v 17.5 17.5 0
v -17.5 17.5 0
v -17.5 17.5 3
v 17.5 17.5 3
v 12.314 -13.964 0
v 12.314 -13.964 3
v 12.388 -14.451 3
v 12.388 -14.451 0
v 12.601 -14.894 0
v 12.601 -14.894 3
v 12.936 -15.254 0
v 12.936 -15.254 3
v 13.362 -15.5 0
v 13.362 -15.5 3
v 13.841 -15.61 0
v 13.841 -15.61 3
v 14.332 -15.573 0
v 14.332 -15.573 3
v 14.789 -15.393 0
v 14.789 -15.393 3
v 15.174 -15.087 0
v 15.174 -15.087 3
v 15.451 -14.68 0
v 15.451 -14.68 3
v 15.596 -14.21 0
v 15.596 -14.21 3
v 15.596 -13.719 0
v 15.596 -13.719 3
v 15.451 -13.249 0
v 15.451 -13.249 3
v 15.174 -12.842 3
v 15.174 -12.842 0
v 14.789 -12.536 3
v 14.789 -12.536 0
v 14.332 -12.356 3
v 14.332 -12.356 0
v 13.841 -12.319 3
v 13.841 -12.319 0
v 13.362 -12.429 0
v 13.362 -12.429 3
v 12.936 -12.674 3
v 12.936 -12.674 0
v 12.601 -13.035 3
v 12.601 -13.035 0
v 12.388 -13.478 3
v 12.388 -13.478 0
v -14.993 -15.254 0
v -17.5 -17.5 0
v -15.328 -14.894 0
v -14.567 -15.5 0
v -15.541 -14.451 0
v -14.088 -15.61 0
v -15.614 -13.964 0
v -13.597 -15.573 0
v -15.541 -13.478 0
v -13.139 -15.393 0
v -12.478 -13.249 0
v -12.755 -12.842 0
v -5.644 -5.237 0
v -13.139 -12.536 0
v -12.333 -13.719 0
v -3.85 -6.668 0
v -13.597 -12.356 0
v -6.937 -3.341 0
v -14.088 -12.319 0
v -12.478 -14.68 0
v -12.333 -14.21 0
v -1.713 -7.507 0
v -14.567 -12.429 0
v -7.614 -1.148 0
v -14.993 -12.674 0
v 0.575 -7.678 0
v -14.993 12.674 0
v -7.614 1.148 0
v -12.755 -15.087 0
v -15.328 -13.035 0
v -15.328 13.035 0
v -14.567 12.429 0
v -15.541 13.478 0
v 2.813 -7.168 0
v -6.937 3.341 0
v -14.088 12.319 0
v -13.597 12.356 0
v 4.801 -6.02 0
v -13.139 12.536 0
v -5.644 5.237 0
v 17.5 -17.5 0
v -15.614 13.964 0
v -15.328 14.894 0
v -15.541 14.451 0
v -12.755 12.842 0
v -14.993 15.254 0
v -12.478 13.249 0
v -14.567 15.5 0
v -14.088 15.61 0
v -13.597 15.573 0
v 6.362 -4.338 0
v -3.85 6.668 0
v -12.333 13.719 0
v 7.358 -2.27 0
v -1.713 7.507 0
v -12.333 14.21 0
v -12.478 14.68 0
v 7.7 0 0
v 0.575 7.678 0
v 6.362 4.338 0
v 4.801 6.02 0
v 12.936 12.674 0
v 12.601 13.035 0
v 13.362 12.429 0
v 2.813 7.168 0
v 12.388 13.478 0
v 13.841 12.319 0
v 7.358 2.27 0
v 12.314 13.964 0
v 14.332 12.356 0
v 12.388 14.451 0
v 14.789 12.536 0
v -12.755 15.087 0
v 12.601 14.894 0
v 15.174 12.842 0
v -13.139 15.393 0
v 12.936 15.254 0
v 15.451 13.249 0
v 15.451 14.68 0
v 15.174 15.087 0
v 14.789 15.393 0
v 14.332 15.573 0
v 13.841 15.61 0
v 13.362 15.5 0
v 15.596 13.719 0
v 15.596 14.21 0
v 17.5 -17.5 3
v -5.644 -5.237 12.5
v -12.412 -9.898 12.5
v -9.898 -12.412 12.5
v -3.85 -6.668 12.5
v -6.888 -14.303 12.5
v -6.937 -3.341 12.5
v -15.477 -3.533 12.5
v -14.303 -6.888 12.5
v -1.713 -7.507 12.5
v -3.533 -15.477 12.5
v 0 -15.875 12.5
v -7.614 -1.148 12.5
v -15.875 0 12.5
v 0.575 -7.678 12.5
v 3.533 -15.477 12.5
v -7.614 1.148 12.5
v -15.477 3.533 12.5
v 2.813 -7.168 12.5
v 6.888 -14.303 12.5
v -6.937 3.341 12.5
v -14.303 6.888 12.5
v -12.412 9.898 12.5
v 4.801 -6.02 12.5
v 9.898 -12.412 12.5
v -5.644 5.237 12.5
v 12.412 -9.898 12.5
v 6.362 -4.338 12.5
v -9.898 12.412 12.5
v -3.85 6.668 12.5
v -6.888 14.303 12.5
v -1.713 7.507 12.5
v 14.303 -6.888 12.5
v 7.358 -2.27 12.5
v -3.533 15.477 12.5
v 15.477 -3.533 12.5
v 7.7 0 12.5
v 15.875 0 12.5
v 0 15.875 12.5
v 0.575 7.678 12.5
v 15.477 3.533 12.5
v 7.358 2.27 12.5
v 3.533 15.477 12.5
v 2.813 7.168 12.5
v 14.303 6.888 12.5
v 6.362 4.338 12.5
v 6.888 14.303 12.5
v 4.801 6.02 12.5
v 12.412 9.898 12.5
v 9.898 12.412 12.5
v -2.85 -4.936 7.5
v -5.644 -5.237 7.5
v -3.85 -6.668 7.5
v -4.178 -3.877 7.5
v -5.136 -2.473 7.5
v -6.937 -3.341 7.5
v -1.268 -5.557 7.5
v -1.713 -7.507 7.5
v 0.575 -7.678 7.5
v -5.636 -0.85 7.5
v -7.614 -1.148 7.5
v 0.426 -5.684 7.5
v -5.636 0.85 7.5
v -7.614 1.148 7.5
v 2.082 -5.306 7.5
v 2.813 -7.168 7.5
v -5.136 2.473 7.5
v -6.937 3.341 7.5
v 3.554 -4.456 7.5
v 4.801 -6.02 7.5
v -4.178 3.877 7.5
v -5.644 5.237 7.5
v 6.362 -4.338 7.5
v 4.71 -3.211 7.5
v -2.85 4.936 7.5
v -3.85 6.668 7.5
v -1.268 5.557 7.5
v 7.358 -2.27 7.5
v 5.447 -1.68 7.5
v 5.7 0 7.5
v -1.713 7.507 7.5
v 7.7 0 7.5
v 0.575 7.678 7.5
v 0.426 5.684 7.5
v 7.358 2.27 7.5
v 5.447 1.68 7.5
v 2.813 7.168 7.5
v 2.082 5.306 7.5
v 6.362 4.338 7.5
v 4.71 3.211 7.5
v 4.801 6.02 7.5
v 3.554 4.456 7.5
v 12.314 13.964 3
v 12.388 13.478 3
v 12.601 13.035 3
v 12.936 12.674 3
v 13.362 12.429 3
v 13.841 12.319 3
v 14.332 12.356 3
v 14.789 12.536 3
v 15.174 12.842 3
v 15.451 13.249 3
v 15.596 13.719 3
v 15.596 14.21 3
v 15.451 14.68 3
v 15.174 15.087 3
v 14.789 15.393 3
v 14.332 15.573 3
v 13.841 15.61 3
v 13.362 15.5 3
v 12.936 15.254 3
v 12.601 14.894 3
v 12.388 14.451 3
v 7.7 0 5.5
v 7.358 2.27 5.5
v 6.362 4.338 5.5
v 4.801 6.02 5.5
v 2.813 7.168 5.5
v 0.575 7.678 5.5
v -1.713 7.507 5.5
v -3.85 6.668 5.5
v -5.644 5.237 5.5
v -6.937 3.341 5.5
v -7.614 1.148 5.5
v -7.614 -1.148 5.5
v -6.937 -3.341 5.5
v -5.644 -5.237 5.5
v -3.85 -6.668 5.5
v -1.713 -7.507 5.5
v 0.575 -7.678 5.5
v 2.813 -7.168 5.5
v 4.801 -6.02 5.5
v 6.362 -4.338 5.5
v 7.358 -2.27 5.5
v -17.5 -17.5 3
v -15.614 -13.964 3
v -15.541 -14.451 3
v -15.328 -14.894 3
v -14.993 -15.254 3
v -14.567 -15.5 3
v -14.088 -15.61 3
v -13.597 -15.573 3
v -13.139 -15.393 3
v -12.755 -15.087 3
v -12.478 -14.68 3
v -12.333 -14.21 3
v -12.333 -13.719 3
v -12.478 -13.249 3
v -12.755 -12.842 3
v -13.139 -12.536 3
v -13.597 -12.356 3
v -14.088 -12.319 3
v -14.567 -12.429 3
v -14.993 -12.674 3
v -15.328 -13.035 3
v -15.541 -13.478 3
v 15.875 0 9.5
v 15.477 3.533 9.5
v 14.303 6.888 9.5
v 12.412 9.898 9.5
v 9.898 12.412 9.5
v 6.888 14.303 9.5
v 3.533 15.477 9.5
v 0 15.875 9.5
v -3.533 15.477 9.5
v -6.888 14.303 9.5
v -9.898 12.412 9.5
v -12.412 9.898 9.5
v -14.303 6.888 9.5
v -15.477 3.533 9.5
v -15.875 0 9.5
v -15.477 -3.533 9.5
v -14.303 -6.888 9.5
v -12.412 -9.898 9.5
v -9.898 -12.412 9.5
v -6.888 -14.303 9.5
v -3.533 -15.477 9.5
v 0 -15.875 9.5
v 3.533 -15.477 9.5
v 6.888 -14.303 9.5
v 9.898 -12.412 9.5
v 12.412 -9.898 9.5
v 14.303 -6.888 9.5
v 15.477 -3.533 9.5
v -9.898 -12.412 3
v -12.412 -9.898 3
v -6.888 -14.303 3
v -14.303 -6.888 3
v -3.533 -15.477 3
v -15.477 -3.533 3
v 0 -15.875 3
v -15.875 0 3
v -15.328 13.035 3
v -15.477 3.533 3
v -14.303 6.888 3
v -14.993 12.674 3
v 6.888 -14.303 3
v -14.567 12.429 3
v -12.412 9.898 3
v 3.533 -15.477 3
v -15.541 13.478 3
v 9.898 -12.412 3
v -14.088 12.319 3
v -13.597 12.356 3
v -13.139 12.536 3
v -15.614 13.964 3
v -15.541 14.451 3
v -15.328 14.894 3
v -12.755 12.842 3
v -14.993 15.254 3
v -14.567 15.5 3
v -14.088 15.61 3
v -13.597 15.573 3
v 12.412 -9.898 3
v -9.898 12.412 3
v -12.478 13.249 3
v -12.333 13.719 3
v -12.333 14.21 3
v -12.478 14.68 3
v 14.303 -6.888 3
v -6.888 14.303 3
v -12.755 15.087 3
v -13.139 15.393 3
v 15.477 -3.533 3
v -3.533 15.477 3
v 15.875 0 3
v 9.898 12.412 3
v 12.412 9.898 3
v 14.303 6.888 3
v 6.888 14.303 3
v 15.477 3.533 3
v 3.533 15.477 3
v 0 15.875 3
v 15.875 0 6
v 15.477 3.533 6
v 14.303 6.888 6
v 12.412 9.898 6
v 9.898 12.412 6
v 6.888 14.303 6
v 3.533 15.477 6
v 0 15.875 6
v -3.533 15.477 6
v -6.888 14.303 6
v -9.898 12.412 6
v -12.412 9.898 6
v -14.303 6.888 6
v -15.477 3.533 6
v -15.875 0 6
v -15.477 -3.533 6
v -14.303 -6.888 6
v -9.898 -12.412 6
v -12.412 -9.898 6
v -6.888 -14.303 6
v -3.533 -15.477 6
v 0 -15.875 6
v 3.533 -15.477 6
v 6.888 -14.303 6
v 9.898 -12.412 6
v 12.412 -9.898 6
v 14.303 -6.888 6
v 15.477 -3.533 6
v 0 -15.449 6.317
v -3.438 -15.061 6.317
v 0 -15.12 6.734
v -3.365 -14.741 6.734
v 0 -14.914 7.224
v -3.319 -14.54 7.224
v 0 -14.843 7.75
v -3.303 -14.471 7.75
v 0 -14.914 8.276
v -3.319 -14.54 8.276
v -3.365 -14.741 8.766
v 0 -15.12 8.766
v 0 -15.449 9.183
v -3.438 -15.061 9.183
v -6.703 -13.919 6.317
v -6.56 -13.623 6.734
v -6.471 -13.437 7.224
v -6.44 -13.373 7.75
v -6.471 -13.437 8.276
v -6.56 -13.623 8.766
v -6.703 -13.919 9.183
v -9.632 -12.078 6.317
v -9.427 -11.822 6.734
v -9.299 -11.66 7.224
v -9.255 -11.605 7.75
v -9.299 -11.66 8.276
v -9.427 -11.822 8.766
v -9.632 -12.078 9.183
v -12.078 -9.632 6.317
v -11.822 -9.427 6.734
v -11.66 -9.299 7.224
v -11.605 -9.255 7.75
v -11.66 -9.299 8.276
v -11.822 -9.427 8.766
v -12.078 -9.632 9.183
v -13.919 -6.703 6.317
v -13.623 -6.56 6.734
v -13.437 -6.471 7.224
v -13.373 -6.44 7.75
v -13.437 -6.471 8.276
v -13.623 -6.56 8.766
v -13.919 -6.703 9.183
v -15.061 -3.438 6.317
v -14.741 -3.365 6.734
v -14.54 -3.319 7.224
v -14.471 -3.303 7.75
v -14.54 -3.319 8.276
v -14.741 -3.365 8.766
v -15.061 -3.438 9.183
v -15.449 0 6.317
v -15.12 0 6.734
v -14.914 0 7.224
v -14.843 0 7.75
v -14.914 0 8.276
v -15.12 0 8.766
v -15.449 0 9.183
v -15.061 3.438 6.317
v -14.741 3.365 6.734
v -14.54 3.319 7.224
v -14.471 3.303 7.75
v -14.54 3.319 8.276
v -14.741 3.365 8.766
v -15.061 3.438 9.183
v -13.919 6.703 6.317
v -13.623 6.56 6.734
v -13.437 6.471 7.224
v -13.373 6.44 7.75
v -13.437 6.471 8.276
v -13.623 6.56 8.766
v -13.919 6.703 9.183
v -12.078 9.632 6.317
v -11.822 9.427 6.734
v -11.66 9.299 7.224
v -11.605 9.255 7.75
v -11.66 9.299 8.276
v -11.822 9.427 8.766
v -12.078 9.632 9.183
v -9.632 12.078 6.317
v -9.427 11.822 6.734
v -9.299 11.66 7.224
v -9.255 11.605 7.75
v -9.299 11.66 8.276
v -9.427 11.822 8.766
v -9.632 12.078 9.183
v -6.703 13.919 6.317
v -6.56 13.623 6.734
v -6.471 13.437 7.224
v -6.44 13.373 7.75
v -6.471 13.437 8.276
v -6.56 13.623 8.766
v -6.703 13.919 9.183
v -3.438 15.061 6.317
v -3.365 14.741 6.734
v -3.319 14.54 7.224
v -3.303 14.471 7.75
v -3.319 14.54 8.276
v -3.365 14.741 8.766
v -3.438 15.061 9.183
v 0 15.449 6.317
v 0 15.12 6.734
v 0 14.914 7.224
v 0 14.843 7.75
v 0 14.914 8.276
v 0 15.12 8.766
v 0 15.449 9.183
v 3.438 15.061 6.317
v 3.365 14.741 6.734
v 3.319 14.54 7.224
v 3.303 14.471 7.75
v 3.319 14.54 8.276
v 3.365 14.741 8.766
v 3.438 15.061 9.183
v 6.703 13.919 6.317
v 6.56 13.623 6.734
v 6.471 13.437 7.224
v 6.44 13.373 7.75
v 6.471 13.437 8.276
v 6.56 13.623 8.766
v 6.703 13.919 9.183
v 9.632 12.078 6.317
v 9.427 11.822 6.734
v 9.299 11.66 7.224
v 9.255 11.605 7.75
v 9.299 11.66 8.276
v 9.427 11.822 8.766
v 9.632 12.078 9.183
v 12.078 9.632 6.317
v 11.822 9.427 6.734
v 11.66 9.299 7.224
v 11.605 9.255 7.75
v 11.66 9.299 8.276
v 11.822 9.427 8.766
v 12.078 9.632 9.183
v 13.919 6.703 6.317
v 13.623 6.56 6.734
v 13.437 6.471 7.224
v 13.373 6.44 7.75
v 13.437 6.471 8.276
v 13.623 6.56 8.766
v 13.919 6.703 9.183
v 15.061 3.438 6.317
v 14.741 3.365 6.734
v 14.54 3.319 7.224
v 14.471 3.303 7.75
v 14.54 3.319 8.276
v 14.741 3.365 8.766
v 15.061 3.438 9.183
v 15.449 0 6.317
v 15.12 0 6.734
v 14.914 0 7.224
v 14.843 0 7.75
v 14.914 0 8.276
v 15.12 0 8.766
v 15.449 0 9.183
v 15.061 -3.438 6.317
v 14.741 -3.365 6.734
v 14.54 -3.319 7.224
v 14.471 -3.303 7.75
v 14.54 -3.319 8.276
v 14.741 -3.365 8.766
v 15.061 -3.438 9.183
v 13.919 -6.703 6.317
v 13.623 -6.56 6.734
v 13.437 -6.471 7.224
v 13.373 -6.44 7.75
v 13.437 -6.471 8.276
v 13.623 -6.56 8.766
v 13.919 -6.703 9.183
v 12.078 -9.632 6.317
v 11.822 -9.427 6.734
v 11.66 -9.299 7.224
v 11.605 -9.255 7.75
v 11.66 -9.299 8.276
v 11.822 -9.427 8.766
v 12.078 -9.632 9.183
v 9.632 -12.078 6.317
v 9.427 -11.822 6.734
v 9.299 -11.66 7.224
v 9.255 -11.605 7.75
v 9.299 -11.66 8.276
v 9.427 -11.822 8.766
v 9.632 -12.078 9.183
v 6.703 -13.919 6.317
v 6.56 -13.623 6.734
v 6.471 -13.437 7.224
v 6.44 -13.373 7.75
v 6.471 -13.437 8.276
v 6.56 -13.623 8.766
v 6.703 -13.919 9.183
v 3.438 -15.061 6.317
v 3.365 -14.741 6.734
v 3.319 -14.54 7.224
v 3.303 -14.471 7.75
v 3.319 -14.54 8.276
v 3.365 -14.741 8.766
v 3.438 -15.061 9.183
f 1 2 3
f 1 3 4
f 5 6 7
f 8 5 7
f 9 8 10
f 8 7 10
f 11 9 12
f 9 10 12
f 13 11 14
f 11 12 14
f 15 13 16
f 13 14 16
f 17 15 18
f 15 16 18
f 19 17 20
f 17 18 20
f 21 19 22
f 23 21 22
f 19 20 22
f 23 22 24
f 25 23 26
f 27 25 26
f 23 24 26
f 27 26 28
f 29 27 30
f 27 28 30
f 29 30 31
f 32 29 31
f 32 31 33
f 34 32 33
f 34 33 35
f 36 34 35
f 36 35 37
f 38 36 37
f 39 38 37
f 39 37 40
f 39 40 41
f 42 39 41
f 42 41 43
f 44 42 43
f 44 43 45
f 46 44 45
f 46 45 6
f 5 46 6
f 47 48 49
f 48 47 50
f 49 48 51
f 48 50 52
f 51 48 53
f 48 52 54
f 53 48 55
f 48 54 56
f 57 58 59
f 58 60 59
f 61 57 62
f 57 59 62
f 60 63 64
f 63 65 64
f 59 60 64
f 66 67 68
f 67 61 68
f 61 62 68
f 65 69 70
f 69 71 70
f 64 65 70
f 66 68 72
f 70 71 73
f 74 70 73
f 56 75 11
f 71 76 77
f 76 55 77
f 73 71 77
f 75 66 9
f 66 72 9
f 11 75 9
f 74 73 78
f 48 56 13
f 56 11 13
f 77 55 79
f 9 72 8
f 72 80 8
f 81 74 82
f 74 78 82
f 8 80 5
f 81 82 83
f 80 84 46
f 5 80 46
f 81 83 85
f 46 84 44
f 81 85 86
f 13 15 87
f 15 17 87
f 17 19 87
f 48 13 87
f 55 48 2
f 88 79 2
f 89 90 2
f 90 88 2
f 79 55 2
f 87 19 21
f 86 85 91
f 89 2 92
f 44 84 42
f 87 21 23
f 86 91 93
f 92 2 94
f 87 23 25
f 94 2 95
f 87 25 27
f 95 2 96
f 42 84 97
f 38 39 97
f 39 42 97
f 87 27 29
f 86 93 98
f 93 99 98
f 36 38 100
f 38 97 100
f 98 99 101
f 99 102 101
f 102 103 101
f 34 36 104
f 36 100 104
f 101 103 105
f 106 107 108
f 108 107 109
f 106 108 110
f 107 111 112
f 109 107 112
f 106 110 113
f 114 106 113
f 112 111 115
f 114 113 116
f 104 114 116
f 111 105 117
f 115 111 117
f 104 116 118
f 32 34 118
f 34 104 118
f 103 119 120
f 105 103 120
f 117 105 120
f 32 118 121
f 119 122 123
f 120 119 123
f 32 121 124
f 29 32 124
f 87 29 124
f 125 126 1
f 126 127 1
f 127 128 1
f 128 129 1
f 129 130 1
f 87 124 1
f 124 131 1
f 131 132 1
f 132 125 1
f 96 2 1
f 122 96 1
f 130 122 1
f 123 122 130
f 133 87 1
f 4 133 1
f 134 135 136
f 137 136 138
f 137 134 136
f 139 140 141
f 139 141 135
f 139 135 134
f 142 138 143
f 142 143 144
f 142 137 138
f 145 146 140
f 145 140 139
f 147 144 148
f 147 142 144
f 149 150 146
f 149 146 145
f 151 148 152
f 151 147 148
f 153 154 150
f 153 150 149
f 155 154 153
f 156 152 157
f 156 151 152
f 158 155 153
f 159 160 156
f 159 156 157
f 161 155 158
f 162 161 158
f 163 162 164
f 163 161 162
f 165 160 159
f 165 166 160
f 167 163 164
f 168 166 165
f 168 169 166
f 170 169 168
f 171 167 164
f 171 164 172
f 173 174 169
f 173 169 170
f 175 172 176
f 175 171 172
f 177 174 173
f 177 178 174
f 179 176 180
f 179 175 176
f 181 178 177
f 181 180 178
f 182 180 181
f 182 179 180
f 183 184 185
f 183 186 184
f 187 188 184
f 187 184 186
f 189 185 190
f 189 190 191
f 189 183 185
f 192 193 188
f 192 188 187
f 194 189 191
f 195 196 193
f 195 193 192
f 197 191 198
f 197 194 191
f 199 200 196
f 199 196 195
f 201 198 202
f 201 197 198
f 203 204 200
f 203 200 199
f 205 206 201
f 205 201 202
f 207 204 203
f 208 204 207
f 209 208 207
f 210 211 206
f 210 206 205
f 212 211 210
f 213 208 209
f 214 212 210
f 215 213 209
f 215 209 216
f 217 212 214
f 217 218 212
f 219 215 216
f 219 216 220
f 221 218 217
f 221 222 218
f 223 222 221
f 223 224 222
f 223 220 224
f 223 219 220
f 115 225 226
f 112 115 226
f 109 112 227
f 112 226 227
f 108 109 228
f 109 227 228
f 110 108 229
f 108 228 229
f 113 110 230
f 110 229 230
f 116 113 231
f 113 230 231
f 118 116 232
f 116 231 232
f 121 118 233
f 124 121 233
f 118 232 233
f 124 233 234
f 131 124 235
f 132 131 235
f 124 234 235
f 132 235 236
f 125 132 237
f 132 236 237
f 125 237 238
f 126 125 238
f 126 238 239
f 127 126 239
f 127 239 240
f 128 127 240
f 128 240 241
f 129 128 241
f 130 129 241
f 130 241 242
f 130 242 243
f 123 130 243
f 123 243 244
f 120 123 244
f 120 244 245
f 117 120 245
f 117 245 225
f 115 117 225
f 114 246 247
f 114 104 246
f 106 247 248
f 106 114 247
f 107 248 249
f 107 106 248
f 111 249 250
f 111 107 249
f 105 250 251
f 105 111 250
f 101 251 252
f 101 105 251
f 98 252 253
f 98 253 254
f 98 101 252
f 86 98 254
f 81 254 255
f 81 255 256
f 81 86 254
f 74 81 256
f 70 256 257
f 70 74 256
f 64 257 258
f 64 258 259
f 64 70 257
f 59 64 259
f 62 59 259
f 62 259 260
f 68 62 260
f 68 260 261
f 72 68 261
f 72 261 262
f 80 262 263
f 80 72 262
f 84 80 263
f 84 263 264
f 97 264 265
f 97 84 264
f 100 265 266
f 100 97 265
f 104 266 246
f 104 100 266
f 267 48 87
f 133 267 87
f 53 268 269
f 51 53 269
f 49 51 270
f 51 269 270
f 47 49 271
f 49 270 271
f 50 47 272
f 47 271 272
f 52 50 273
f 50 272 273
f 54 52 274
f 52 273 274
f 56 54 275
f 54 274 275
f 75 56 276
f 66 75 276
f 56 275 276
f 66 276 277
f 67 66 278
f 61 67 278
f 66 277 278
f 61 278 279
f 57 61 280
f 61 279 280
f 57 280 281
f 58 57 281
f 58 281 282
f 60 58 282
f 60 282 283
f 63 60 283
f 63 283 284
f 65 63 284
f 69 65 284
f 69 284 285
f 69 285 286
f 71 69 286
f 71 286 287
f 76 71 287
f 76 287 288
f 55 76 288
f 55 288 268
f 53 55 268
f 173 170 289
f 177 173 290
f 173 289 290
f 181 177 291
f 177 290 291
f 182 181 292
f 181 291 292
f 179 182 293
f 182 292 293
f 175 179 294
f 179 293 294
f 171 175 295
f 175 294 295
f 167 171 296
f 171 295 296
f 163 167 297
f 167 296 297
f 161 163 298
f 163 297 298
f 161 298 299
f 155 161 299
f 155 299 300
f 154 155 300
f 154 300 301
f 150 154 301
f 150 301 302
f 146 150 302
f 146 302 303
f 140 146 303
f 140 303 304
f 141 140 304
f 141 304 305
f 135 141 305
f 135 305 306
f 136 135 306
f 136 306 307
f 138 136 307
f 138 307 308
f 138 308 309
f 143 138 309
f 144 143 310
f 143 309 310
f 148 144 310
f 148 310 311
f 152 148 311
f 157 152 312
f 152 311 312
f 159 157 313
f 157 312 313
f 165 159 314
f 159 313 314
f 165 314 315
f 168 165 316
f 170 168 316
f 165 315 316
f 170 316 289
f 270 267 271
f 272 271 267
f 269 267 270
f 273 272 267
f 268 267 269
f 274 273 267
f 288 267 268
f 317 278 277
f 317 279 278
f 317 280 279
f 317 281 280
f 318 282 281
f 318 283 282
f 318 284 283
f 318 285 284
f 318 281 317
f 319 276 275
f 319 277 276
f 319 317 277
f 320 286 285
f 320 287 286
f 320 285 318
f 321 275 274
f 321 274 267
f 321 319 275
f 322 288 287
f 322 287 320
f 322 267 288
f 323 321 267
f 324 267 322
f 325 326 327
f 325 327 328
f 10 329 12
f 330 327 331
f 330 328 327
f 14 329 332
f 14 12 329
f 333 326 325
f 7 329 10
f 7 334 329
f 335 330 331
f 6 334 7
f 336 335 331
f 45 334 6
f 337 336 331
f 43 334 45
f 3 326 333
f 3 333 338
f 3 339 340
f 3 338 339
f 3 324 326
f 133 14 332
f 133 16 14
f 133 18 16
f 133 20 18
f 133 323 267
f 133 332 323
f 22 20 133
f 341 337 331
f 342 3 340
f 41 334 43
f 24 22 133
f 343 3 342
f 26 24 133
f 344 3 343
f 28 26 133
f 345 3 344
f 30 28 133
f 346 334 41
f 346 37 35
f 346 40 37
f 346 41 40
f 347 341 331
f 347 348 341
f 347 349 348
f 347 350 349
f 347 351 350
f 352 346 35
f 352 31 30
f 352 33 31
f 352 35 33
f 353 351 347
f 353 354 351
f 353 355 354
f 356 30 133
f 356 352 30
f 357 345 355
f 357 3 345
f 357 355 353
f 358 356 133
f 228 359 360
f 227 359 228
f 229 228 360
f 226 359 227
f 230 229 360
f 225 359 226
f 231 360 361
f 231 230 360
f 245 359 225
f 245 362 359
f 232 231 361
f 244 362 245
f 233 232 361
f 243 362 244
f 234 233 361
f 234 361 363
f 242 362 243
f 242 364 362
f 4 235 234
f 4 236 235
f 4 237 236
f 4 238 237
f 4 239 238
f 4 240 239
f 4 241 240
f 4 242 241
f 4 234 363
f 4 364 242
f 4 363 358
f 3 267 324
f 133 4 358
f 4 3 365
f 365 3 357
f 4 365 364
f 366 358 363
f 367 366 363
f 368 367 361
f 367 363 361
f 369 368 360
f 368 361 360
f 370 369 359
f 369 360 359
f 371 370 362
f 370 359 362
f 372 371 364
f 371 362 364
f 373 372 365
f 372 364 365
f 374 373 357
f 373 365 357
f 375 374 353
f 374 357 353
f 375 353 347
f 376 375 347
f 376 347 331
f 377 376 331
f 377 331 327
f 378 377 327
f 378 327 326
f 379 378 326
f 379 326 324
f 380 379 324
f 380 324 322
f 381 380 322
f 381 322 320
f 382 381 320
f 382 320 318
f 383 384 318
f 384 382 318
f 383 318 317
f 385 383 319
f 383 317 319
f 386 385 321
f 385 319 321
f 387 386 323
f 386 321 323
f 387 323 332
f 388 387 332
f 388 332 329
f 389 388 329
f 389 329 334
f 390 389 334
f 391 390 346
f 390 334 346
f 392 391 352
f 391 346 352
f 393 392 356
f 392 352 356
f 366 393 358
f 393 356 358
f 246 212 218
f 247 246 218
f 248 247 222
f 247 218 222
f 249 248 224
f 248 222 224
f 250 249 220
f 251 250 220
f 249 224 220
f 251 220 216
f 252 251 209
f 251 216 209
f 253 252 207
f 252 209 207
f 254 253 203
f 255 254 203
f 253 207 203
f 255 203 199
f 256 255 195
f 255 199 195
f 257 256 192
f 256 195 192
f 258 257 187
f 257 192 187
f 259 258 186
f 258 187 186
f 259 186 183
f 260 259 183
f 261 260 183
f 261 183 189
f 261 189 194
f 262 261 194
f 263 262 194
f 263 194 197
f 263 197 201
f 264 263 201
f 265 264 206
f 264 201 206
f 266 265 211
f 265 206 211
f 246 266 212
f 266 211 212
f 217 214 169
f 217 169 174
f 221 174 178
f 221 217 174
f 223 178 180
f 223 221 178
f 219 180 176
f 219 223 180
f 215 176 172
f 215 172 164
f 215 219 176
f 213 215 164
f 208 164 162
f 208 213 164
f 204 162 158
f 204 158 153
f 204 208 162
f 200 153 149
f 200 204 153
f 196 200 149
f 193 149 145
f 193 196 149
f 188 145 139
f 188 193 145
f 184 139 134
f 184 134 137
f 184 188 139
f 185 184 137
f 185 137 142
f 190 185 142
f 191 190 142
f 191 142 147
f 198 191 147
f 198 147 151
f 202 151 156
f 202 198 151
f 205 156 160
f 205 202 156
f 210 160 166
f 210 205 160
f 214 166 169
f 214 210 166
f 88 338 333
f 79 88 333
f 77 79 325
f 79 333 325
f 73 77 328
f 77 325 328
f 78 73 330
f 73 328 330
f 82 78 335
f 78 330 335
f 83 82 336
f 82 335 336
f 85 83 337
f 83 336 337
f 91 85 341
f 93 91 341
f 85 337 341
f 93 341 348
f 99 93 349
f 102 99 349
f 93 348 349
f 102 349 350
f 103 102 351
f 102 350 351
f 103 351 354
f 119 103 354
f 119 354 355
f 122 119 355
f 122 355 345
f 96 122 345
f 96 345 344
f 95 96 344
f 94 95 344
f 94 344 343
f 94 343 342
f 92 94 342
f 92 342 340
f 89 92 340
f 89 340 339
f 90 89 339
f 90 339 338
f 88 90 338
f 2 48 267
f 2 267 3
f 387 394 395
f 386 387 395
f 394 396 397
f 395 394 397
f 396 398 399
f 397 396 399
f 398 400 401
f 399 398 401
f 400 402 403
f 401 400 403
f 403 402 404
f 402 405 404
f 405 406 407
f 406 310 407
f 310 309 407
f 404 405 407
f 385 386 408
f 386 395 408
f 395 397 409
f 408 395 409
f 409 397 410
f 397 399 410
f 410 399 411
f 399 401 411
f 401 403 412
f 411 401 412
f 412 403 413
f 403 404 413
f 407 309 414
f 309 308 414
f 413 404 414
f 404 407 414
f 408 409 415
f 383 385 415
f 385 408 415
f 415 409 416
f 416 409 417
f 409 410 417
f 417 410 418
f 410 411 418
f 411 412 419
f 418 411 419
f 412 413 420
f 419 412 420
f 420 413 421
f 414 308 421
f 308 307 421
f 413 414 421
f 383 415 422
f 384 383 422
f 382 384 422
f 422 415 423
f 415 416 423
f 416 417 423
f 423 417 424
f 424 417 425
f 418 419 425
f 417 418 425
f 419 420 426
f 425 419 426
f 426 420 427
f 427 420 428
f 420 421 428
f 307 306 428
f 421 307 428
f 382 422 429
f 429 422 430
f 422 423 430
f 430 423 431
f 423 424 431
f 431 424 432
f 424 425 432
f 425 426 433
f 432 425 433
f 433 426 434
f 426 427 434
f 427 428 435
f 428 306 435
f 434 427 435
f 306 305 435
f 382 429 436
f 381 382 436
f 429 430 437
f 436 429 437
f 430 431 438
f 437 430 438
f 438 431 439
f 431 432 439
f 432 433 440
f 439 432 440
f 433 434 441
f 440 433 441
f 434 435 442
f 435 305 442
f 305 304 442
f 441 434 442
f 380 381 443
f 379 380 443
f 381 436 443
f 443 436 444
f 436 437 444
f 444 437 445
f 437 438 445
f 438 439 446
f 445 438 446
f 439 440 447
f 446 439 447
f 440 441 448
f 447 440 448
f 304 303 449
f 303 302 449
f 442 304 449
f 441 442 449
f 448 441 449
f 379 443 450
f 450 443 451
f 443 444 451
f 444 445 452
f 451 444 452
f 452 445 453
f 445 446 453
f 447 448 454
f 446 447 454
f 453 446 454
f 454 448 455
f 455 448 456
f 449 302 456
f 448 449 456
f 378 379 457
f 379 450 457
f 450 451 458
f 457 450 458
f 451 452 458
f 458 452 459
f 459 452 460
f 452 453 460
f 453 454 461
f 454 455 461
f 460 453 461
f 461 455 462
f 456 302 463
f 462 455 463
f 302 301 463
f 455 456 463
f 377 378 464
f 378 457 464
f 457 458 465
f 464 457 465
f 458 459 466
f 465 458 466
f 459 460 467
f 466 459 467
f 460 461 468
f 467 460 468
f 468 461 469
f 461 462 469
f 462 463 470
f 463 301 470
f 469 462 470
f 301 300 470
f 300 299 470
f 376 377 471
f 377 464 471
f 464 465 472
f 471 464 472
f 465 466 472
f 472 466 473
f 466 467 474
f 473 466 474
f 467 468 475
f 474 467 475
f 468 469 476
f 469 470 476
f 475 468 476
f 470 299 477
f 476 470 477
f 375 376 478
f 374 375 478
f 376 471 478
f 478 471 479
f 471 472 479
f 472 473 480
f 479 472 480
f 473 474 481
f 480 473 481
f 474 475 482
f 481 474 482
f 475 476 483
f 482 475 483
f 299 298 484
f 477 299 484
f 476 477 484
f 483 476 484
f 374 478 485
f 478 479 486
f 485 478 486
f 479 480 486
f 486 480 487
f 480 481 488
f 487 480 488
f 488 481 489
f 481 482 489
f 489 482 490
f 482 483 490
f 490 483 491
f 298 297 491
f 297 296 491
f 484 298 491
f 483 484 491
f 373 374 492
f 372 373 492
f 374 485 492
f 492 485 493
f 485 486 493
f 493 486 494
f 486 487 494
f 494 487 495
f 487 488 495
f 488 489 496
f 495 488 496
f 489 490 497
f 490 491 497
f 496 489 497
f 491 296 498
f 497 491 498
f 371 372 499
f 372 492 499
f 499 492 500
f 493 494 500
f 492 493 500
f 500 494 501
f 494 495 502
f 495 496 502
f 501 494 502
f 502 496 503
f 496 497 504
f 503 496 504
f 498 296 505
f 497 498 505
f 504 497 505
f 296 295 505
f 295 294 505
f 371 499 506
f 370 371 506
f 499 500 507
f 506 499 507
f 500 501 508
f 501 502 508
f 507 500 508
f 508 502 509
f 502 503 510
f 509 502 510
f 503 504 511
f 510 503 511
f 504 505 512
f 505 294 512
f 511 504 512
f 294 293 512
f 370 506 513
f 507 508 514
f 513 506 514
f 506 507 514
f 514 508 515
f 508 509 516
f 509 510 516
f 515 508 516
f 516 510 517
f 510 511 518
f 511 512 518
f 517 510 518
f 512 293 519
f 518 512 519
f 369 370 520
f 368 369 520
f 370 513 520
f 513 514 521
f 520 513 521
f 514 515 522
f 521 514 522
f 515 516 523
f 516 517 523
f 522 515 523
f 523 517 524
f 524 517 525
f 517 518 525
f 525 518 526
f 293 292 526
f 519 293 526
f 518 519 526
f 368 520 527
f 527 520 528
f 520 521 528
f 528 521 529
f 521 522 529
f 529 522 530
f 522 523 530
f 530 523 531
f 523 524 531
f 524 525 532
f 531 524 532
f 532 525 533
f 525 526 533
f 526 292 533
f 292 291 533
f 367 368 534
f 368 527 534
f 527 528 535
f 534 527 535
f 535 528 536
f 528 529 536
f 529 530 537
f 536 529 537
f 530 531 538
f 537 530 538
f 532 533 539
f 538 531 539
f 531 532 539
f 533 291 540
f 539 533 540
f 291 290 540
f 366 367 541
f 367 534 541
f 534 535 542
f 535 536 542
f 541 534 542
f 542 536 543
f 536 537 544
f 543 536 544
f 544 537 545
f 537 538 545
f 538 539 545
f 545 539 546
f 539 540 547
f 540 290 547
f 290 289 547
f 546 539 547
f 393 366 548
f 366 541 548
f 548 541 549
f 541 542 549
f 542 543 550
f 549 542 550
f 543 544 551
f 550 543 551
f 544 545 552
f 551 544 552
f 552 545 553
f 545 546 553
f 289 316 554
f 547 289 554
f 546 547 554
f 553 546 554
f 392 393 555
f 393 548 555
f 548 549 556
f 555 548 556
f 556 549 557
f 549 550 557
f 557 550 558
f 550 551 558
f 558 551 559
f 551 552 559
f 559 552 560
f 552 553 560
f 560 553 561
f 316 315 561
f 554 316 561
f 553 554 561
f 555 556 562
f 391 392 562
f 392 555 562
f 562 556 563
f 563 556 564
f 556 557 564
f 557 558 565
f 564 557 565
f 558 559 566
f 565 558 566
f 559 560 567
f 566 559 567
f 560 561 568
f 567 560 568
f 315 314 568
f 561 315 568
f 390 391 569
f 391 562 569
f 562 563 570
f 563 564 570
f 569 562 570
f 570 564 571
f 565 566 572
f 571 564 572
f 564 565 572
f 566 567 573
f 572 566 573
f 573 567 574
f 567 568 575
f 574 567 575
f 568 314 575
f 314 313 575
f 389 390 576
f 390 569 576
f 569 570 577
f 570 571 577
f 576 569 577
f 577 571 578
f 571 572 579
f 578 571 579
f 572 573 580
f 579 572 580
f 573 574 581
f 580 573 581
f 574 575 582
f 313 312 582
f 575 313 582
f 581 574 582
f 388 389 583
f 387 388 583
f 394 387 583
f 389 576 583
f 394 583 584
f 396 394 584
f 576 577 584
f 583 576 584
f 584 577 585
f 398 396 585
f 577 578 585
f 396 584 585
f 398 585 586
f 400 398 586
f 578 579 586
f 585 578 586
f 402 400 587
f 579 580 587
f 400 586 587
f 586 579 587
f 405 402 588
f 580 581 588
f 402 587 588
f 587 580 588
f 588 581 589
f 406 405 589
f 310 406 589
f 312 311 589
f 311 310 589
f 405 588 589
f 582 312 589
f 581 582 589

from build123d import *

# Parameters (mm, degrees)
F2_W      = 35
F2_H      = 35
F2_R      = 15.875
F2_R_2    = 7.7
F3_DEPTH  = 3
F4_D      = 3.3
F4_DEPTH  = 13.905
F4_TIP    = 0.9914200214
F5_R      = 15.875
F5_R_2    = 7.7
F6_DEPTH  = 9.5
F10_R     = 7.7
F10_R_2   = 5.7
F11_DEPTH = 2
F12_SIZE  = 1.99999


# Not quite as in the source:
# - a fillet or chamfer is up to 0.001 mm smaller than in the source, because OpenCascade refuses the exact size


with BuildPart() as f3:
    # F2 (on Top) → F3 (new body)
    with BuildSketch(Plane.XY):
        Rectangle(F2_W, F2_H)
        Circle(F2_R, mode=Mode.SUBTRACT)
        Circle(F2_R)
        Circle(F2_R_2, mode=Mode.SUBTRACT)
    extrude(amount=F3_DEPTH)

    # F4
    with Locations(Plane(origin=(0, 0, 0), x_dir=(1, 0, 0), z_dir=(0, 0, -1))):
        with Locations((-13.9644660941, 13.9644660941), (-13.9644660941, -13.9644660941), (13.9644660941, -13.9644660941), (13.9644660941, 13.9644660941)):
            Hole(F4_D / 2, depth=F4_DEPTH)
            with Locations((0, 0, -(F4_DEPTH + F4_TIP / 2))):  # 118° drill point
                Cone(0, F4_D / 2, F4_TIP, mode=Mode.SUBTRACT)

    # F5 (on face) → F6 (join)
    with BuildSketch(Plane.XY.offset(3)):
        Circle(F5_R)
        Circle(F5_R_2, mode=Mode.SUBTRACT)
    extrude(amount=F6_DEPTH)

    # F7 (on Right) → F8 (revolve, cut)
    with BuildSketch(Plane.YZ):
        with BuildLine():
            ThreePointArc((-15.875, 6), (-14.8432458366, 7.75), (-15.875, 9.5))
            Line((-15.875, 9.5), (-15.875, 6))
        make_face()
    revolve(axis=Axis((0, 0, 3), (0, 0, -1)), mode=Mode.SUBTRACT)

    # F10 (on offset) → F11 (join)
    with BuildSketch(Plane.XY.offset(5.5)):
        Circle(F10_R)
        Circle(F10_R_2, mode=Mode.SUBTRACT)
    extrude(amount=F11_DEPTH)

    # F12 (size 2 in the source; OpenCascade refuses exactly that, so slightly less here)
    f12_edges = [f3.edges().sort_by_distance(p)[0] for p in [
        (-5.7, 0, 5.5),
    ]]
    chamfer(f12_edges, length=F12_SIZE)


solid = f3.part
